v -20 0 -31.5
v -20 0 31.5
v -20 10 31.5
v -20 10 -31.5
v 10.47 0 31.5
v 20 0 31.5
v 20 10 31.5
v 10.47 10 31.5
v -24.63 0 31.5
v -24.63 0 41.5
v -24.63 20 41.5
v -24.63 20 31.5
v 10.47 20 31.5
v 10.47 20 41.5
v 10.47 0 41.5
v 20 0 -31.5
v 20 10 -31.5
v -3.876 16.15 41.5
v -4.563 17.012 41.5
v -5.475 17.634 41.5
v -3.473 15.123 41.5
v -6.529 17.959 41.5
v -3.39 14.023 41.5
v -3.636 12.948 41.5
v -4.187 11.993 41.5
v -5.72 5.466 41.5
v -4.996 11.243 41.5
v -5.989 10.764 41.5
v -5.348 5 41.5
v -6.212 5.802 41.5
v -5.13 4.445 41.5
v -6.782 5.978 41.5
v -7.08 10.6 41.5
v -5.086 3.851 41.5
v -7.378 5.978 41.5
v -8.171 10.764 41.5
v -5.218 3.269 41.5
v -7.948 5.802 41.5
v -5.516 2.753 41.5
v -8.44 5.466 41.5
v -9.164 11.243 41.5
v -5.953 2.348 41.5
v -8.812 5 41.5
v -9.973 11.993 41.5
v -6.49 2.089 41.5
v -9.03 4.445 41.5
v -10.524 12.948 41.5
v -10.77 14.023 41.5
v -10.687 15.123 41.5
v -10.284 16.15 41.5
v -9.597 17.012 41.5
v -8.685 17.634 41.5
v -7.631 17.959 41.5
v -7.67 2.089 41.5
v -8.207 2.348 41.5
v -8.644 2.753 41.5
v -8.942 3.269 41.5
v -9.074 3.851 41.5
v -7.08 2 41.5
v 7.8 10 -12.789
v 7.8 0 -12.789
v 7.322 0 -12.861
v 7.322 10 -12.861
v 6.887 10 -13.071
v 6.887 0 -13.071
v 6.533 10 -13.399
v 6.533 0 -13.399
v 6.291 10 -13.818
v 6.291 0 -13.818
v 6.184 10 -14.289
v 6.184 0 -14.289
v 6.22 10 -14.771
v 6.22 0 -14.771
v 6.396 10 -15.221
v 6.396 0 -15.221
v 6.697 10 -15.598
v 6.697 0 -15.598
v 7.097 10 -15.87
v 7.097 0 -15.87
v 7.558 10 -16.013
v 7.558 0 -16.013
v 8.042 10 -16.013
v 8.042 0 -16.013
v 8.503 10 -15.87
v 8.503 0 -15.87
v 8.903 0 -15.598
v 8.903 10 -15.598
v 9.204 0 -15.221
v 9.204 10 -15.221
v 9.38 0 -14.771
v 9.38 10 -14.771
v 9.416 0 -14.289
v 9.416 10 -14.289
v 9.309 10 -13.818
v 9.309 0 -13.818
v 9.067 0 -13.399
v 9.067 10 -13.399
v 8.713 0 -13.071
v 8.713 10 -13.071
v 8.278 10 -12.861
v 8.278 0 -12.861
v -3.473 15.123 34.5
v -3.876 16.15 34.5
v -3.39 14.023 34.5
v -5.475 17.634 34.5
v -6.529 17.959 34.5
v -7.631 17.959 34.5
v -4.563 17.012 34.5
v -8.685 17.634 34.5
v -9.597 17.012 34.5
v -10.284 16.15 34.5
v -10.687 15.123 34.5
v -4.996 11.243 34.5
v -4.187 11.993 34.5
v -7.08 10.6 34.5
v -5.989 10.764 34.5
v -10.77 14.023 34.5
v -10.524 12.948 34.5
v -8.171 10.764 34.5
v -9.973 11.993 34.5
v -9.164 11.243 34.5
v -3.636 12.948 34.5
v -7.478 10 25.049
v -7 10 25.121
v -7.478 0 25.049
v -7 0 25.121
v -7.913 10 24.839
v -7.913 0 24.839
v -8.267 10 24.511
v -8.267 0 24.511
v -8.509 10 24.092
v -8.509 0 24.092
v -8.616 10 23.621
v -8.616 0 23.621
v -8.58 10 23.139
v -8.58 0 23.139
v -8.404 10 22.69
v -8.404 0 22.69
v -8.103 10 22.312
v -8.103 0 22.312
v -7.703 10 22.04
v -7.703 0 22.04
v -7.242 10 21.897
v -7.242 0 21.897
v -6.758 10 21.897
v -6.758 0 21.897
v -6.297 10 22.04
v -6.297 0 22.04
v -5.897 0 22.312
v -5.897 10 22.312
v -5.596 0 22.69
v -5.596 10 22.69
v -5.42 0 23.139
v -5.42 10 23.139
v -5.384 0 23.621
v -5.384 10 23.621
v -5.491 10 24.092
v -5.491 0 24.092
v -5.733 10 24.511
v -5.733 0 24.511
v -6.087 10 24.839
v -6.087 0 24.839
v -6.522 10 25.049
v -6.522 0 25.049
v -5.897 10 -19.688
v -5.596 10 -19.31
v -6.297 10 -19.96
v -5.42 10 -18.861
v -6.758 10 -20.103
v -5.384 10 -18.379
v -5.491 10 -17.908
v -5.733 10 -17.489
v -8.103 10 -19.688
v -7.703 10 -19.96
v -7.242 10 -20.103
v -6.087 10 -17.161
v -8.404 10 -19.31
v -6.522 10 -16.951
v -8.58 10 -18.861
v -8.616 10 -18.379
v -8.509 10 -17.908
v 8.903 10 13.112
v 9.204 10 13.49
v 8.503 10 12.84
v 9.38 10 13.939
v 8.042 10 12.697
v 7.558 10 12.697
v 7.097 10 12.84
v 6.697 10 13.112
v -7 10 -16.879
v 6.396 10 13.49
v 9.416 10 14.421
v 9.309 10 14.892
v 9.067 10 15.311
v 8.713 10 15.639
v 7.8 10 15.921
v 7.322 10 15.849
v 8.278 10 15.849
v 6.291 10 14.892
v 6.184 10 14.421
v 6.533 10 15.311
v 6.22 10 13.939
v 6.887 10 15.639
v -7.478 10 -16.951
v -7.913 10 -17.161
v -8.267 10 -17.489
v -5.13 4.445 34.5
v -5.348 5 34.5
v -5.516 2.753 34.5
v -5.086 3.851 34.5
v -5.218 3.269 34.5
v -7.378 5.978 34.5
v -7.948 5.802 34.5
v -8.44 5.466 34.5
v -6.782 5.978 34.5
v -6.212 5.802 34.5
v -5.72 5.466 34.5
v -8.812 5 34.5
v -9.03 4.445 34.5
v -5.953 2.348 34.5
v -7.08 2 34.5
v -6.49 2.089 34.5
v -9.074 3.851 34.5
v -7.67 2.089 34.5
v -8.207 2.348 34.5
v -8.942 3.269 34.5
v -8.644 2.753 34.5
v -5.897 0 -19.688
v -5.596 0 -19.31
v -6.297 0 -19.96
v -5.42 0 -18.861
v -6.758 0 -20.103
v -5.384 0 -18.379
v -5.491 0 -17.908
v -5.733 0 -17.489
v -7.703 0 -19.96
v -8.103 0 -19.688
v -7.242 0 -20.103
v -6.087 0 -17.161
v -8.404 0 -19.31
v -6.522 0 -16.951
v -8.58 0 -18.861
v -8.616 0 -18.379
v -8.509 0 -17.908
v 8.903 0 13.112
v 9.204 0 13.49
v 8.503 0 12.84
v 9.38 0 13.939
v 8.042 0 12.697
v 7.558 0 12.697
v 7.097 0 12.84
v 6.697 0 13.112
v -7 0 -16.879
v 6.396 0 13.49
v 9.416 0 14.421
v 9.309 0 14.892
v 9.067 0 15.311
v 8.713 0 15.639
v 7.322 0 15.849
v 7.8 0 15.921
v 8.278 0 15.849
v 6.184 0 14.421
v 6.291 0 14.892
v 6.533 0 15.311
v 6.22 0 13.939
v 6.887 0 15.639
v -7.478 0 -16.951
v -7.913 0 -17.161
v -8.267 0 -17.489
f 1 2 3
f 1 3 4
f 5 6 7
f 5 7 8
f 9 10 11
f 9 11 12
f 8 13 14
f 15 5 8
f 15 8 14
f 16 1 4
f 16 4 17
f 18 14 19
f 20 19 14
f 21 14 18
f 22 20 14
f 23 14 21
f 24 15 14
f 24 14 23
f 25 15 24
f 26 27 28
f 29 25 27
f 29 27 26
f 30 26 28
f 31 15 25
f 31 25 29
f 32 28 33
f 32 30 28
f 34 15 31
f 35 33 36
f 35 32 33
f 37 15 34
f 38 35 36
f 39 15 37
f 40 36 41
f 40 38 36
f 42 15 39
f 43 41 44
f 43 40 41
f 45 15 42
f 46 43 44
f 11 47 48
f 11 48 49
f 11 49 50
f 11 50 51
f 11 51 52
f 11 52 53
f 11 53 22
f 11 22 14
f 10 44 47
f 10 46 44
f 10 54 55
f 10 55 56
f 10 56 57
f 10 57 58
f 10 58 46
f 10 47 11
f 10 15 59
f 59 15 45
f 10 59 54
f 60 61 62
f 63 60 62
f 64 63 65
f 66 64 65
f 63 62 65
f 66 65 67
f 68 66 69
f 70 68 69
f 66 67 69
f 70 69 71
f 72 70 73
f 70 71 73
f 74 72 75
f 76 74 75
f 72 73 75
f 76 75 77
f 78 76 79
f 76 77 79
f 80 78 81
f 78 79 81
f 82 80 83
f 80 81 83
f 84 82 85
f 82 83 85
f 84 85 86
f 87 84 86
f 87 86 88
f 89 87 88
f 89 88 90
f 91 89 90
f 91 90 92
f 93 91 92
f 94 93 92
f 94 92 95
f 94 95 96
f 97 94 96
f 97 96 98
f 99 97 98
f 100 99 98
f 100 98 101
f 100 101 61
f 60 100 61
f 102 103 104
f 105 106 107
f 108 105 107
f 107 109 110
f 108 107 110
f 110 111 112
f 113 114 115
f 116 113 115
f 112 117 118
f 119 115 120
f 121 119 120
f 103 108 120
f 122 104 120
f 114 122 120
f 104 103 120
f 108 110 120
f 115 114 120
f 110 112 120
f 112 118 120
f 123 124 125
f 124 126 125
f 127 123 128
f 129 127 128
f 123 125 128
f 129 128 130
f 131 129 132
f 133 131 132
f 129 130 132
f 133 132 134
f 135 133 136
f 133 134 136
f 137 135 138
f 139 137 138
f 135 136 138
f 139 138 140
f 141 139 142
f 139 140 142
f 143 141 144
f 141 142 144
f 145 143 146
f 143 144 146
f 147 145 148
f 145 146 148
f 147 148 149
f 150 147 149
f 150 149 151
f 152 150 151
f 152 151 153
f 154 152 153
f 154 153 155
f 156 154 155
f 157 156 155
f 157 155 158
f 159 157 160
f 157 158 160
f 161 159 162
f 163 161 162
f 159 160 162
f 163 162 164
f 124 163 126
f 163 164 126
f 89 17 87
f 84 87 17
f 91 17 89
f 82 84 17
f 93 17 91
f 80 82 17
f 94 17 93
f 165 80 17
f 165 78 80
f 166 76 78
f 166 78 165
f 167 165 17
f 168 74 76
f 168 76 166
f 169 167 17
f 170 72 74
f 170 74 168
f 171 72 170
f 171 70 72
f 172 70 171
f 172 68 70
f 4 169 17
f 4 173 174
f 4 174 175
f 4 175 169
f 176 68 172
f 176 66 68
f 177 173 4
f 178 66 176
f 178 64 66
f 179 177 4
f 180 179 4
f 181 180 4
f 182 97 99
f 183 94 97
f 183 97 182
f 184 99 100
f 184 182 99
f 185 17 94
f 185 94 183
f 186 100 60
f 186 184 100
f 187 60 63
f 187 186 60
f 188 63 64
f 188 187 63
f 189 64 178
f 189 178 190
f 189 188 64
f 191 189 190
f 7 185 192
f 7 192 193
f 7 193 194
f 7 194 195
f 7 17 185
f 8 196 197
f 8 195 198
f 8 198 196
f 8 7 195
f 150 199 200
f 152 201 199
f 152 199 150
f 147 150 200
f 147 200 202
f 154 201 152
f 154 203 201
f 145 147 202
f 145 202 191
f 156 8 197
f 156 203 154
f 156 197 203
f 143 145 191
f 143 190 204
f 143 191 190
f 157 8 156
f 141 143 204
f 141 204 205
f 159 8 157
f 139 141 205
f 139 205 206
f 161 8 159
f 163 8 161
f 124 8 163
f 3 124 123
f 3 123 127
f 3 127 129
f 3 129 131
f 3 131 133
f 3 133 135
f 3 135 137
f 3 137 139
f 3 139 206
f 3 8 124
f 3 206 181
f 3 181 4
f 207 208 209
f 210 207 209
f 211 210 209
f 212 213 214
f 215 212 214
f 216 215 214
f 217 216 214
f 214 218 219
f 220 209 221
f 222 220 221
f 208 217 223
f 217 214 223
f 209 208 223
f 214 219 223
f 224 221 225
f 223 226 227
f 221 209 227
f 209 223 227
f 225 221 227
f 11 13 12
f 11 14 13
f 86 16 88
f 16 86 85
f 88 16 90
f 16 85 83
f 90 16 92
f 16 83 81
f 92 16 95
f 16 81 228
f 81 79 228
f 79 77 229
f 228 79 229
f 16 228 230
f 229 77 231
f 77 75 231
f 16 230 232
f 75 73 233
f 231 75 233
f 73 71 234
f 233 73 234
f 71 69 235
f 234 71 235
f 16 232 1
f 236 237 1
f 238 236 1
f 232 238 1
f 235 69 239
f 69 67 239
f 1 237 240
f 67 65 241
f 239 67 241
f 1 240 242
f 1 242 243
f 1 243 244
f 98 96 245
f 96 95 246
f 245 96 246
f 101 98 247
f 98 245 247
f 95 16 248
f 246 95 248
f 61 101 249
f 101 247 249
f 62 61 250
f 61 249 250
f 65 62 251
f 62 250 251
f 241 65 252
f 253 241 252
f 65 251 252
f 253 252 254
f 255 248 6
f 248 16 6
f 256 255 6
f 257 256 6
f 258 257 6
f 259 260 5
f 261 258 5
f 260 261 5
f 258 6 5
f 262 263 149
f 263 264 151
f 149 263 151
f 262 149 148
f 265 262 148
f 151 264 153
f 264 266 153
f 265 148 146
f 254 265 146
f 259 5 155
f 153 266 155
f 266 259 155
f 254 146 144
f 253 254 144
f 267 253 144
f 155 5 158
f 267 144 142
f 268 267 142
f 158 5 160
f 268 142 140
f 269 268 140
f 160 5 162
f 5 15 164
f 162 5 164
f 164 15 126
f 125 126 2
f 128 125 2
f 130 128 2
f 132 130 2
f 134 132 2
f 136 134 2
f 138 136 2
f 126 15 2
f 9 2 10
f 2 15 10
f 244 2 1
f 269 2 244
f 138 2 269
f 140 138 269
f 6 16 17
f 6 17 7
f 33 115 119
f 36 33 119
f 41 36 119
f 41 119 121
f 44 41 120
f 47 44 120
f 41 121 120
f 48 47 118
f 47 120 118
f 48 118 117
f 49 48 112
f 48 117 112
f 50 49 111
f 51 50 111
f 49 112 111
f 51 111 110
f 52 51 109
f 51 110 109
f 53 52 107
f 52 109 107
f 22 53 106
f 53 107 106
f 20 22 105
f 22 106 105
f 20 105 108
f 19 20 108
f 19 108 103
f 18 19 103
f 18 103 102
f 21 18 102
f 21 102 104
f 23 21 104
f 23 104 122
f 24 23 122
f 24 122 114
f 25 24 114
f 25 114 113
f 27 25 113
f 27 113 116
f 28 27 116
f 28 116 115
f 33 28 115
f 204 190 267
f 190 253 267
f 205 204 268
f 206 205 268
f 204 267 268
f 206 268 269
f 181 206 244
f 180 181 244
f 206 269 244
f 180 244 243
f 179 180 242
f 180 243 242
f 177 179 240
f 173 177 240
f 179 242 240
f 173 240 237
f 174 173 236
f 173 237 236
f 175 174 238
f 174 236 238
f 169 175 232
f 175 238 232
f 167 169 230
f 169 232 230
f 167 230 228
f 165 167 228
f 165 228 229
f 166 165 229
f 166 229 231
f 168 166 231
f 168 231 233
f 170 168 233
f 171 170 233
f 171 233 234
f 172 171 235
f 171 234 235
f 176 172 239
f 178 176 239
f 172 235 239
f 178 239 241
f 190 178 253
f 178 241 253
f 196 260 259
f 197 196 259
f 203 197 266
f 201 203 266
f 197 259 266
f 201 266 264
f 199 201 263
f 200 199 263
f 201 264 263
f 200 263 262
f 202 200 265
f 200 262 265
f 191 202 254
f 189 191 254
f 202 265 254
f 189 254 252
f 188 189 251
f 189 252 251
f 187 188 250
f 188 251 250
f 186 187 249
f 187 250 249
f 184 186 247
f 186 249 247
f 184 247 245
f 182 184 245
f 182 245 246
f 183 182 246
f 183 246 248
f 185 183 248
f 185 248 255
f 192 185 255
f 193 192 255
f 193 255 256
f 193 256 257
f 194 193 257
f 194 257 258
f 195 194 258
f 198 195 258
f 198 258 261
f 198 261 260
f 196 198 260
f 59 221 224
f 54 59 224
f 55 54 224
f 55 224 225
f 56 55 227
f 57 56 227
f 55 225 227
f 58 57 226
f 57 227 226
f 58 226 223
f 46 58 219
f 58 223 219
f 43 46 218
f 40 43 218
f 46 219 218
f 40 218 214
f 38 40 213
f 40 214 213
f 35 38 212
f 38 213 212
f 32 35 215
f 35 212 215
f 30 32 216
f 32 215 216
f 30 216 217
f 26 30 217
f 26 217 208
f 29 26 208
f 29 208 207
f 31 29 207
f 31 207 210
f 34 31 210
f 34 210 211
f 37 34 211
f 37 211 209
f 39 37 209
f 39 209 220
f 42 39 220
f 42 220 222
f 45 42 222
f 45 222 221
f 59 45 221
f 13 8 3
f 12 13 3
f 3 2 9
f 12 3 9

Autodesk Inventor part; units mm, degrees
ref_plane "YZ Plane" through (0, 0, 0) normal (1, 0, 0) x (0, 1, 0)
ref_plane "XZ Plane" through (0, 0, 0) normal (0, 1, 0) x (-1, 0, 0)
ref_plane "XY Plane" through (0, 0, 0) normal (0, 0, 1) x (1, 0, 0)
sketch "Sketch2" plane through (0, 0, 0) normal (0, 1, 0) x (-1, 0, 0)
  line L0 (0, -46.1) -> (0, 56.1) projected
  line L1 (33.556, 0) -> (-28.926, 0) projected
  line L2 (20, -31.5) -> (-20, -31.5)
  line L3 (-20, -31.5) -> (-20, 31.5)
  line L4 (-20, 31.5) -> (20, 31.5)
  line L5 (20, 31.5) -> (20, -31.5)
  line L6 (20, -31.5) -> (-20, 31.5) construction
  line L7 (-20, -31.5) -> (20, 31.5) construction
  line L8 (24.63, 31.5) -> (-10.47, 31.5)
  line L9 (-10.47, 31.5) -> (-10.47, 41.5)
  line L10 (-10.47, 41.5) -> (24.63, 41.5)
  line L11 (24.63, 41.5) -> (24.63, 31.5)
  line L12 (24.63, 31.5) -> (-10.47, 41.5) construction
  line L13 (-10.47, 31.5) -> (24.63, 41.5) construction
  point P0 (0, 0)
  point P1 (7.08, 36.5)
  point P2 (-10.47, 31.5)
  dimension "d5" = 40
  dimension "d6" = 63
  dimension "d7" = 9.53
  dimension "d8" = 35.1
  dimension "d9" = 73
extrude "Extrusion1" add sketch "Sketch2" along normal blind 10 contours L2 L3 L1 L0 | L0 L1 L5 L2 | L1 L3 L4 L0 | L0 L4 L5 L1
extrude "Extrusion2" add sketch "Sketch2" along normal blind 20 contours L4 L9 L10 L0 | L0 L10 L11 L8 L4
sketch "Sketch3" plane through (0, 10, 0) normal (0, 1, 0) x (1, 0, 0)
  line L0 (-20, 31.5) -> (-20, -31.5) projected
  line L1 (20, 31.5) -> (-20, 31.5) projected
  line L2 (20, -31.5) -> (20, 31.5) projected
  point P0 (0, 0)
  point P1 (-7, 18.5)
  point P2 (-7, -23.5)
  point P3 (7.8, 14.41)
  point P4 (7.8, -14.3)
  dimension "d21" = 13
  dimension "d22" = 13
  dimension "d23" = 42
  dimension "d24" = 13
  dimension "d25" = 12.2
  dimension "d26" = 12.2
  dimension "d27" = 17.09
  dimension "d28" = 28.71
hole "Hole1" at (-7, 10, -18.5) at (-7, 10, 23.5) at (7.8, 10, -14.41) at (7.8, 10, 14.3) direction (0, -1, 0) diameter 3.242 end through all thread size "M4x0.7" class "6H" standard "ISO Metric profile"
sketch "Sketch4" plane through (-24.63, 0, 41.5) normal (0, 0, 1) x (1, 0, 0)
  line L0 (0, 20) -> (35.1, 20) projected
  line L1 (35.1, 0) -> (35.1, 20) projected
  point P0 (24.63, 0)
  point P1 (17.55, 14.3)
  dimension "d36" = 5.7
  dimension "d37" = 17.55
hole "Hole2" at (-7.08, 14.3, 41.5) direction (0, 0, -1) diameter 7.4 depth 7
sketch "Sketch5" plane through (-24.63, 0, 41.5) normal (0, 0, 1) x (1, 0, 0)
  circle A0 centre (17.55, 14.3) radius 3.7 projected
  line L0 (0, 0) -> (35.1, 0) projected
  line L1 (35.1, 0) -> (35.1, 20) projected
  point P0 (24.63, 0)
  point P1 (17.55, 4)
  dimension "d46" = 4
  dimension "d47" = 17.55
hole "Hole3" at (-7.08, 4, 41.5) direction (0, 0, -1) diameter 4 depth 7
properties part number "uchwyt_strzykawka_dol" material "PC/ABS Plastic"
